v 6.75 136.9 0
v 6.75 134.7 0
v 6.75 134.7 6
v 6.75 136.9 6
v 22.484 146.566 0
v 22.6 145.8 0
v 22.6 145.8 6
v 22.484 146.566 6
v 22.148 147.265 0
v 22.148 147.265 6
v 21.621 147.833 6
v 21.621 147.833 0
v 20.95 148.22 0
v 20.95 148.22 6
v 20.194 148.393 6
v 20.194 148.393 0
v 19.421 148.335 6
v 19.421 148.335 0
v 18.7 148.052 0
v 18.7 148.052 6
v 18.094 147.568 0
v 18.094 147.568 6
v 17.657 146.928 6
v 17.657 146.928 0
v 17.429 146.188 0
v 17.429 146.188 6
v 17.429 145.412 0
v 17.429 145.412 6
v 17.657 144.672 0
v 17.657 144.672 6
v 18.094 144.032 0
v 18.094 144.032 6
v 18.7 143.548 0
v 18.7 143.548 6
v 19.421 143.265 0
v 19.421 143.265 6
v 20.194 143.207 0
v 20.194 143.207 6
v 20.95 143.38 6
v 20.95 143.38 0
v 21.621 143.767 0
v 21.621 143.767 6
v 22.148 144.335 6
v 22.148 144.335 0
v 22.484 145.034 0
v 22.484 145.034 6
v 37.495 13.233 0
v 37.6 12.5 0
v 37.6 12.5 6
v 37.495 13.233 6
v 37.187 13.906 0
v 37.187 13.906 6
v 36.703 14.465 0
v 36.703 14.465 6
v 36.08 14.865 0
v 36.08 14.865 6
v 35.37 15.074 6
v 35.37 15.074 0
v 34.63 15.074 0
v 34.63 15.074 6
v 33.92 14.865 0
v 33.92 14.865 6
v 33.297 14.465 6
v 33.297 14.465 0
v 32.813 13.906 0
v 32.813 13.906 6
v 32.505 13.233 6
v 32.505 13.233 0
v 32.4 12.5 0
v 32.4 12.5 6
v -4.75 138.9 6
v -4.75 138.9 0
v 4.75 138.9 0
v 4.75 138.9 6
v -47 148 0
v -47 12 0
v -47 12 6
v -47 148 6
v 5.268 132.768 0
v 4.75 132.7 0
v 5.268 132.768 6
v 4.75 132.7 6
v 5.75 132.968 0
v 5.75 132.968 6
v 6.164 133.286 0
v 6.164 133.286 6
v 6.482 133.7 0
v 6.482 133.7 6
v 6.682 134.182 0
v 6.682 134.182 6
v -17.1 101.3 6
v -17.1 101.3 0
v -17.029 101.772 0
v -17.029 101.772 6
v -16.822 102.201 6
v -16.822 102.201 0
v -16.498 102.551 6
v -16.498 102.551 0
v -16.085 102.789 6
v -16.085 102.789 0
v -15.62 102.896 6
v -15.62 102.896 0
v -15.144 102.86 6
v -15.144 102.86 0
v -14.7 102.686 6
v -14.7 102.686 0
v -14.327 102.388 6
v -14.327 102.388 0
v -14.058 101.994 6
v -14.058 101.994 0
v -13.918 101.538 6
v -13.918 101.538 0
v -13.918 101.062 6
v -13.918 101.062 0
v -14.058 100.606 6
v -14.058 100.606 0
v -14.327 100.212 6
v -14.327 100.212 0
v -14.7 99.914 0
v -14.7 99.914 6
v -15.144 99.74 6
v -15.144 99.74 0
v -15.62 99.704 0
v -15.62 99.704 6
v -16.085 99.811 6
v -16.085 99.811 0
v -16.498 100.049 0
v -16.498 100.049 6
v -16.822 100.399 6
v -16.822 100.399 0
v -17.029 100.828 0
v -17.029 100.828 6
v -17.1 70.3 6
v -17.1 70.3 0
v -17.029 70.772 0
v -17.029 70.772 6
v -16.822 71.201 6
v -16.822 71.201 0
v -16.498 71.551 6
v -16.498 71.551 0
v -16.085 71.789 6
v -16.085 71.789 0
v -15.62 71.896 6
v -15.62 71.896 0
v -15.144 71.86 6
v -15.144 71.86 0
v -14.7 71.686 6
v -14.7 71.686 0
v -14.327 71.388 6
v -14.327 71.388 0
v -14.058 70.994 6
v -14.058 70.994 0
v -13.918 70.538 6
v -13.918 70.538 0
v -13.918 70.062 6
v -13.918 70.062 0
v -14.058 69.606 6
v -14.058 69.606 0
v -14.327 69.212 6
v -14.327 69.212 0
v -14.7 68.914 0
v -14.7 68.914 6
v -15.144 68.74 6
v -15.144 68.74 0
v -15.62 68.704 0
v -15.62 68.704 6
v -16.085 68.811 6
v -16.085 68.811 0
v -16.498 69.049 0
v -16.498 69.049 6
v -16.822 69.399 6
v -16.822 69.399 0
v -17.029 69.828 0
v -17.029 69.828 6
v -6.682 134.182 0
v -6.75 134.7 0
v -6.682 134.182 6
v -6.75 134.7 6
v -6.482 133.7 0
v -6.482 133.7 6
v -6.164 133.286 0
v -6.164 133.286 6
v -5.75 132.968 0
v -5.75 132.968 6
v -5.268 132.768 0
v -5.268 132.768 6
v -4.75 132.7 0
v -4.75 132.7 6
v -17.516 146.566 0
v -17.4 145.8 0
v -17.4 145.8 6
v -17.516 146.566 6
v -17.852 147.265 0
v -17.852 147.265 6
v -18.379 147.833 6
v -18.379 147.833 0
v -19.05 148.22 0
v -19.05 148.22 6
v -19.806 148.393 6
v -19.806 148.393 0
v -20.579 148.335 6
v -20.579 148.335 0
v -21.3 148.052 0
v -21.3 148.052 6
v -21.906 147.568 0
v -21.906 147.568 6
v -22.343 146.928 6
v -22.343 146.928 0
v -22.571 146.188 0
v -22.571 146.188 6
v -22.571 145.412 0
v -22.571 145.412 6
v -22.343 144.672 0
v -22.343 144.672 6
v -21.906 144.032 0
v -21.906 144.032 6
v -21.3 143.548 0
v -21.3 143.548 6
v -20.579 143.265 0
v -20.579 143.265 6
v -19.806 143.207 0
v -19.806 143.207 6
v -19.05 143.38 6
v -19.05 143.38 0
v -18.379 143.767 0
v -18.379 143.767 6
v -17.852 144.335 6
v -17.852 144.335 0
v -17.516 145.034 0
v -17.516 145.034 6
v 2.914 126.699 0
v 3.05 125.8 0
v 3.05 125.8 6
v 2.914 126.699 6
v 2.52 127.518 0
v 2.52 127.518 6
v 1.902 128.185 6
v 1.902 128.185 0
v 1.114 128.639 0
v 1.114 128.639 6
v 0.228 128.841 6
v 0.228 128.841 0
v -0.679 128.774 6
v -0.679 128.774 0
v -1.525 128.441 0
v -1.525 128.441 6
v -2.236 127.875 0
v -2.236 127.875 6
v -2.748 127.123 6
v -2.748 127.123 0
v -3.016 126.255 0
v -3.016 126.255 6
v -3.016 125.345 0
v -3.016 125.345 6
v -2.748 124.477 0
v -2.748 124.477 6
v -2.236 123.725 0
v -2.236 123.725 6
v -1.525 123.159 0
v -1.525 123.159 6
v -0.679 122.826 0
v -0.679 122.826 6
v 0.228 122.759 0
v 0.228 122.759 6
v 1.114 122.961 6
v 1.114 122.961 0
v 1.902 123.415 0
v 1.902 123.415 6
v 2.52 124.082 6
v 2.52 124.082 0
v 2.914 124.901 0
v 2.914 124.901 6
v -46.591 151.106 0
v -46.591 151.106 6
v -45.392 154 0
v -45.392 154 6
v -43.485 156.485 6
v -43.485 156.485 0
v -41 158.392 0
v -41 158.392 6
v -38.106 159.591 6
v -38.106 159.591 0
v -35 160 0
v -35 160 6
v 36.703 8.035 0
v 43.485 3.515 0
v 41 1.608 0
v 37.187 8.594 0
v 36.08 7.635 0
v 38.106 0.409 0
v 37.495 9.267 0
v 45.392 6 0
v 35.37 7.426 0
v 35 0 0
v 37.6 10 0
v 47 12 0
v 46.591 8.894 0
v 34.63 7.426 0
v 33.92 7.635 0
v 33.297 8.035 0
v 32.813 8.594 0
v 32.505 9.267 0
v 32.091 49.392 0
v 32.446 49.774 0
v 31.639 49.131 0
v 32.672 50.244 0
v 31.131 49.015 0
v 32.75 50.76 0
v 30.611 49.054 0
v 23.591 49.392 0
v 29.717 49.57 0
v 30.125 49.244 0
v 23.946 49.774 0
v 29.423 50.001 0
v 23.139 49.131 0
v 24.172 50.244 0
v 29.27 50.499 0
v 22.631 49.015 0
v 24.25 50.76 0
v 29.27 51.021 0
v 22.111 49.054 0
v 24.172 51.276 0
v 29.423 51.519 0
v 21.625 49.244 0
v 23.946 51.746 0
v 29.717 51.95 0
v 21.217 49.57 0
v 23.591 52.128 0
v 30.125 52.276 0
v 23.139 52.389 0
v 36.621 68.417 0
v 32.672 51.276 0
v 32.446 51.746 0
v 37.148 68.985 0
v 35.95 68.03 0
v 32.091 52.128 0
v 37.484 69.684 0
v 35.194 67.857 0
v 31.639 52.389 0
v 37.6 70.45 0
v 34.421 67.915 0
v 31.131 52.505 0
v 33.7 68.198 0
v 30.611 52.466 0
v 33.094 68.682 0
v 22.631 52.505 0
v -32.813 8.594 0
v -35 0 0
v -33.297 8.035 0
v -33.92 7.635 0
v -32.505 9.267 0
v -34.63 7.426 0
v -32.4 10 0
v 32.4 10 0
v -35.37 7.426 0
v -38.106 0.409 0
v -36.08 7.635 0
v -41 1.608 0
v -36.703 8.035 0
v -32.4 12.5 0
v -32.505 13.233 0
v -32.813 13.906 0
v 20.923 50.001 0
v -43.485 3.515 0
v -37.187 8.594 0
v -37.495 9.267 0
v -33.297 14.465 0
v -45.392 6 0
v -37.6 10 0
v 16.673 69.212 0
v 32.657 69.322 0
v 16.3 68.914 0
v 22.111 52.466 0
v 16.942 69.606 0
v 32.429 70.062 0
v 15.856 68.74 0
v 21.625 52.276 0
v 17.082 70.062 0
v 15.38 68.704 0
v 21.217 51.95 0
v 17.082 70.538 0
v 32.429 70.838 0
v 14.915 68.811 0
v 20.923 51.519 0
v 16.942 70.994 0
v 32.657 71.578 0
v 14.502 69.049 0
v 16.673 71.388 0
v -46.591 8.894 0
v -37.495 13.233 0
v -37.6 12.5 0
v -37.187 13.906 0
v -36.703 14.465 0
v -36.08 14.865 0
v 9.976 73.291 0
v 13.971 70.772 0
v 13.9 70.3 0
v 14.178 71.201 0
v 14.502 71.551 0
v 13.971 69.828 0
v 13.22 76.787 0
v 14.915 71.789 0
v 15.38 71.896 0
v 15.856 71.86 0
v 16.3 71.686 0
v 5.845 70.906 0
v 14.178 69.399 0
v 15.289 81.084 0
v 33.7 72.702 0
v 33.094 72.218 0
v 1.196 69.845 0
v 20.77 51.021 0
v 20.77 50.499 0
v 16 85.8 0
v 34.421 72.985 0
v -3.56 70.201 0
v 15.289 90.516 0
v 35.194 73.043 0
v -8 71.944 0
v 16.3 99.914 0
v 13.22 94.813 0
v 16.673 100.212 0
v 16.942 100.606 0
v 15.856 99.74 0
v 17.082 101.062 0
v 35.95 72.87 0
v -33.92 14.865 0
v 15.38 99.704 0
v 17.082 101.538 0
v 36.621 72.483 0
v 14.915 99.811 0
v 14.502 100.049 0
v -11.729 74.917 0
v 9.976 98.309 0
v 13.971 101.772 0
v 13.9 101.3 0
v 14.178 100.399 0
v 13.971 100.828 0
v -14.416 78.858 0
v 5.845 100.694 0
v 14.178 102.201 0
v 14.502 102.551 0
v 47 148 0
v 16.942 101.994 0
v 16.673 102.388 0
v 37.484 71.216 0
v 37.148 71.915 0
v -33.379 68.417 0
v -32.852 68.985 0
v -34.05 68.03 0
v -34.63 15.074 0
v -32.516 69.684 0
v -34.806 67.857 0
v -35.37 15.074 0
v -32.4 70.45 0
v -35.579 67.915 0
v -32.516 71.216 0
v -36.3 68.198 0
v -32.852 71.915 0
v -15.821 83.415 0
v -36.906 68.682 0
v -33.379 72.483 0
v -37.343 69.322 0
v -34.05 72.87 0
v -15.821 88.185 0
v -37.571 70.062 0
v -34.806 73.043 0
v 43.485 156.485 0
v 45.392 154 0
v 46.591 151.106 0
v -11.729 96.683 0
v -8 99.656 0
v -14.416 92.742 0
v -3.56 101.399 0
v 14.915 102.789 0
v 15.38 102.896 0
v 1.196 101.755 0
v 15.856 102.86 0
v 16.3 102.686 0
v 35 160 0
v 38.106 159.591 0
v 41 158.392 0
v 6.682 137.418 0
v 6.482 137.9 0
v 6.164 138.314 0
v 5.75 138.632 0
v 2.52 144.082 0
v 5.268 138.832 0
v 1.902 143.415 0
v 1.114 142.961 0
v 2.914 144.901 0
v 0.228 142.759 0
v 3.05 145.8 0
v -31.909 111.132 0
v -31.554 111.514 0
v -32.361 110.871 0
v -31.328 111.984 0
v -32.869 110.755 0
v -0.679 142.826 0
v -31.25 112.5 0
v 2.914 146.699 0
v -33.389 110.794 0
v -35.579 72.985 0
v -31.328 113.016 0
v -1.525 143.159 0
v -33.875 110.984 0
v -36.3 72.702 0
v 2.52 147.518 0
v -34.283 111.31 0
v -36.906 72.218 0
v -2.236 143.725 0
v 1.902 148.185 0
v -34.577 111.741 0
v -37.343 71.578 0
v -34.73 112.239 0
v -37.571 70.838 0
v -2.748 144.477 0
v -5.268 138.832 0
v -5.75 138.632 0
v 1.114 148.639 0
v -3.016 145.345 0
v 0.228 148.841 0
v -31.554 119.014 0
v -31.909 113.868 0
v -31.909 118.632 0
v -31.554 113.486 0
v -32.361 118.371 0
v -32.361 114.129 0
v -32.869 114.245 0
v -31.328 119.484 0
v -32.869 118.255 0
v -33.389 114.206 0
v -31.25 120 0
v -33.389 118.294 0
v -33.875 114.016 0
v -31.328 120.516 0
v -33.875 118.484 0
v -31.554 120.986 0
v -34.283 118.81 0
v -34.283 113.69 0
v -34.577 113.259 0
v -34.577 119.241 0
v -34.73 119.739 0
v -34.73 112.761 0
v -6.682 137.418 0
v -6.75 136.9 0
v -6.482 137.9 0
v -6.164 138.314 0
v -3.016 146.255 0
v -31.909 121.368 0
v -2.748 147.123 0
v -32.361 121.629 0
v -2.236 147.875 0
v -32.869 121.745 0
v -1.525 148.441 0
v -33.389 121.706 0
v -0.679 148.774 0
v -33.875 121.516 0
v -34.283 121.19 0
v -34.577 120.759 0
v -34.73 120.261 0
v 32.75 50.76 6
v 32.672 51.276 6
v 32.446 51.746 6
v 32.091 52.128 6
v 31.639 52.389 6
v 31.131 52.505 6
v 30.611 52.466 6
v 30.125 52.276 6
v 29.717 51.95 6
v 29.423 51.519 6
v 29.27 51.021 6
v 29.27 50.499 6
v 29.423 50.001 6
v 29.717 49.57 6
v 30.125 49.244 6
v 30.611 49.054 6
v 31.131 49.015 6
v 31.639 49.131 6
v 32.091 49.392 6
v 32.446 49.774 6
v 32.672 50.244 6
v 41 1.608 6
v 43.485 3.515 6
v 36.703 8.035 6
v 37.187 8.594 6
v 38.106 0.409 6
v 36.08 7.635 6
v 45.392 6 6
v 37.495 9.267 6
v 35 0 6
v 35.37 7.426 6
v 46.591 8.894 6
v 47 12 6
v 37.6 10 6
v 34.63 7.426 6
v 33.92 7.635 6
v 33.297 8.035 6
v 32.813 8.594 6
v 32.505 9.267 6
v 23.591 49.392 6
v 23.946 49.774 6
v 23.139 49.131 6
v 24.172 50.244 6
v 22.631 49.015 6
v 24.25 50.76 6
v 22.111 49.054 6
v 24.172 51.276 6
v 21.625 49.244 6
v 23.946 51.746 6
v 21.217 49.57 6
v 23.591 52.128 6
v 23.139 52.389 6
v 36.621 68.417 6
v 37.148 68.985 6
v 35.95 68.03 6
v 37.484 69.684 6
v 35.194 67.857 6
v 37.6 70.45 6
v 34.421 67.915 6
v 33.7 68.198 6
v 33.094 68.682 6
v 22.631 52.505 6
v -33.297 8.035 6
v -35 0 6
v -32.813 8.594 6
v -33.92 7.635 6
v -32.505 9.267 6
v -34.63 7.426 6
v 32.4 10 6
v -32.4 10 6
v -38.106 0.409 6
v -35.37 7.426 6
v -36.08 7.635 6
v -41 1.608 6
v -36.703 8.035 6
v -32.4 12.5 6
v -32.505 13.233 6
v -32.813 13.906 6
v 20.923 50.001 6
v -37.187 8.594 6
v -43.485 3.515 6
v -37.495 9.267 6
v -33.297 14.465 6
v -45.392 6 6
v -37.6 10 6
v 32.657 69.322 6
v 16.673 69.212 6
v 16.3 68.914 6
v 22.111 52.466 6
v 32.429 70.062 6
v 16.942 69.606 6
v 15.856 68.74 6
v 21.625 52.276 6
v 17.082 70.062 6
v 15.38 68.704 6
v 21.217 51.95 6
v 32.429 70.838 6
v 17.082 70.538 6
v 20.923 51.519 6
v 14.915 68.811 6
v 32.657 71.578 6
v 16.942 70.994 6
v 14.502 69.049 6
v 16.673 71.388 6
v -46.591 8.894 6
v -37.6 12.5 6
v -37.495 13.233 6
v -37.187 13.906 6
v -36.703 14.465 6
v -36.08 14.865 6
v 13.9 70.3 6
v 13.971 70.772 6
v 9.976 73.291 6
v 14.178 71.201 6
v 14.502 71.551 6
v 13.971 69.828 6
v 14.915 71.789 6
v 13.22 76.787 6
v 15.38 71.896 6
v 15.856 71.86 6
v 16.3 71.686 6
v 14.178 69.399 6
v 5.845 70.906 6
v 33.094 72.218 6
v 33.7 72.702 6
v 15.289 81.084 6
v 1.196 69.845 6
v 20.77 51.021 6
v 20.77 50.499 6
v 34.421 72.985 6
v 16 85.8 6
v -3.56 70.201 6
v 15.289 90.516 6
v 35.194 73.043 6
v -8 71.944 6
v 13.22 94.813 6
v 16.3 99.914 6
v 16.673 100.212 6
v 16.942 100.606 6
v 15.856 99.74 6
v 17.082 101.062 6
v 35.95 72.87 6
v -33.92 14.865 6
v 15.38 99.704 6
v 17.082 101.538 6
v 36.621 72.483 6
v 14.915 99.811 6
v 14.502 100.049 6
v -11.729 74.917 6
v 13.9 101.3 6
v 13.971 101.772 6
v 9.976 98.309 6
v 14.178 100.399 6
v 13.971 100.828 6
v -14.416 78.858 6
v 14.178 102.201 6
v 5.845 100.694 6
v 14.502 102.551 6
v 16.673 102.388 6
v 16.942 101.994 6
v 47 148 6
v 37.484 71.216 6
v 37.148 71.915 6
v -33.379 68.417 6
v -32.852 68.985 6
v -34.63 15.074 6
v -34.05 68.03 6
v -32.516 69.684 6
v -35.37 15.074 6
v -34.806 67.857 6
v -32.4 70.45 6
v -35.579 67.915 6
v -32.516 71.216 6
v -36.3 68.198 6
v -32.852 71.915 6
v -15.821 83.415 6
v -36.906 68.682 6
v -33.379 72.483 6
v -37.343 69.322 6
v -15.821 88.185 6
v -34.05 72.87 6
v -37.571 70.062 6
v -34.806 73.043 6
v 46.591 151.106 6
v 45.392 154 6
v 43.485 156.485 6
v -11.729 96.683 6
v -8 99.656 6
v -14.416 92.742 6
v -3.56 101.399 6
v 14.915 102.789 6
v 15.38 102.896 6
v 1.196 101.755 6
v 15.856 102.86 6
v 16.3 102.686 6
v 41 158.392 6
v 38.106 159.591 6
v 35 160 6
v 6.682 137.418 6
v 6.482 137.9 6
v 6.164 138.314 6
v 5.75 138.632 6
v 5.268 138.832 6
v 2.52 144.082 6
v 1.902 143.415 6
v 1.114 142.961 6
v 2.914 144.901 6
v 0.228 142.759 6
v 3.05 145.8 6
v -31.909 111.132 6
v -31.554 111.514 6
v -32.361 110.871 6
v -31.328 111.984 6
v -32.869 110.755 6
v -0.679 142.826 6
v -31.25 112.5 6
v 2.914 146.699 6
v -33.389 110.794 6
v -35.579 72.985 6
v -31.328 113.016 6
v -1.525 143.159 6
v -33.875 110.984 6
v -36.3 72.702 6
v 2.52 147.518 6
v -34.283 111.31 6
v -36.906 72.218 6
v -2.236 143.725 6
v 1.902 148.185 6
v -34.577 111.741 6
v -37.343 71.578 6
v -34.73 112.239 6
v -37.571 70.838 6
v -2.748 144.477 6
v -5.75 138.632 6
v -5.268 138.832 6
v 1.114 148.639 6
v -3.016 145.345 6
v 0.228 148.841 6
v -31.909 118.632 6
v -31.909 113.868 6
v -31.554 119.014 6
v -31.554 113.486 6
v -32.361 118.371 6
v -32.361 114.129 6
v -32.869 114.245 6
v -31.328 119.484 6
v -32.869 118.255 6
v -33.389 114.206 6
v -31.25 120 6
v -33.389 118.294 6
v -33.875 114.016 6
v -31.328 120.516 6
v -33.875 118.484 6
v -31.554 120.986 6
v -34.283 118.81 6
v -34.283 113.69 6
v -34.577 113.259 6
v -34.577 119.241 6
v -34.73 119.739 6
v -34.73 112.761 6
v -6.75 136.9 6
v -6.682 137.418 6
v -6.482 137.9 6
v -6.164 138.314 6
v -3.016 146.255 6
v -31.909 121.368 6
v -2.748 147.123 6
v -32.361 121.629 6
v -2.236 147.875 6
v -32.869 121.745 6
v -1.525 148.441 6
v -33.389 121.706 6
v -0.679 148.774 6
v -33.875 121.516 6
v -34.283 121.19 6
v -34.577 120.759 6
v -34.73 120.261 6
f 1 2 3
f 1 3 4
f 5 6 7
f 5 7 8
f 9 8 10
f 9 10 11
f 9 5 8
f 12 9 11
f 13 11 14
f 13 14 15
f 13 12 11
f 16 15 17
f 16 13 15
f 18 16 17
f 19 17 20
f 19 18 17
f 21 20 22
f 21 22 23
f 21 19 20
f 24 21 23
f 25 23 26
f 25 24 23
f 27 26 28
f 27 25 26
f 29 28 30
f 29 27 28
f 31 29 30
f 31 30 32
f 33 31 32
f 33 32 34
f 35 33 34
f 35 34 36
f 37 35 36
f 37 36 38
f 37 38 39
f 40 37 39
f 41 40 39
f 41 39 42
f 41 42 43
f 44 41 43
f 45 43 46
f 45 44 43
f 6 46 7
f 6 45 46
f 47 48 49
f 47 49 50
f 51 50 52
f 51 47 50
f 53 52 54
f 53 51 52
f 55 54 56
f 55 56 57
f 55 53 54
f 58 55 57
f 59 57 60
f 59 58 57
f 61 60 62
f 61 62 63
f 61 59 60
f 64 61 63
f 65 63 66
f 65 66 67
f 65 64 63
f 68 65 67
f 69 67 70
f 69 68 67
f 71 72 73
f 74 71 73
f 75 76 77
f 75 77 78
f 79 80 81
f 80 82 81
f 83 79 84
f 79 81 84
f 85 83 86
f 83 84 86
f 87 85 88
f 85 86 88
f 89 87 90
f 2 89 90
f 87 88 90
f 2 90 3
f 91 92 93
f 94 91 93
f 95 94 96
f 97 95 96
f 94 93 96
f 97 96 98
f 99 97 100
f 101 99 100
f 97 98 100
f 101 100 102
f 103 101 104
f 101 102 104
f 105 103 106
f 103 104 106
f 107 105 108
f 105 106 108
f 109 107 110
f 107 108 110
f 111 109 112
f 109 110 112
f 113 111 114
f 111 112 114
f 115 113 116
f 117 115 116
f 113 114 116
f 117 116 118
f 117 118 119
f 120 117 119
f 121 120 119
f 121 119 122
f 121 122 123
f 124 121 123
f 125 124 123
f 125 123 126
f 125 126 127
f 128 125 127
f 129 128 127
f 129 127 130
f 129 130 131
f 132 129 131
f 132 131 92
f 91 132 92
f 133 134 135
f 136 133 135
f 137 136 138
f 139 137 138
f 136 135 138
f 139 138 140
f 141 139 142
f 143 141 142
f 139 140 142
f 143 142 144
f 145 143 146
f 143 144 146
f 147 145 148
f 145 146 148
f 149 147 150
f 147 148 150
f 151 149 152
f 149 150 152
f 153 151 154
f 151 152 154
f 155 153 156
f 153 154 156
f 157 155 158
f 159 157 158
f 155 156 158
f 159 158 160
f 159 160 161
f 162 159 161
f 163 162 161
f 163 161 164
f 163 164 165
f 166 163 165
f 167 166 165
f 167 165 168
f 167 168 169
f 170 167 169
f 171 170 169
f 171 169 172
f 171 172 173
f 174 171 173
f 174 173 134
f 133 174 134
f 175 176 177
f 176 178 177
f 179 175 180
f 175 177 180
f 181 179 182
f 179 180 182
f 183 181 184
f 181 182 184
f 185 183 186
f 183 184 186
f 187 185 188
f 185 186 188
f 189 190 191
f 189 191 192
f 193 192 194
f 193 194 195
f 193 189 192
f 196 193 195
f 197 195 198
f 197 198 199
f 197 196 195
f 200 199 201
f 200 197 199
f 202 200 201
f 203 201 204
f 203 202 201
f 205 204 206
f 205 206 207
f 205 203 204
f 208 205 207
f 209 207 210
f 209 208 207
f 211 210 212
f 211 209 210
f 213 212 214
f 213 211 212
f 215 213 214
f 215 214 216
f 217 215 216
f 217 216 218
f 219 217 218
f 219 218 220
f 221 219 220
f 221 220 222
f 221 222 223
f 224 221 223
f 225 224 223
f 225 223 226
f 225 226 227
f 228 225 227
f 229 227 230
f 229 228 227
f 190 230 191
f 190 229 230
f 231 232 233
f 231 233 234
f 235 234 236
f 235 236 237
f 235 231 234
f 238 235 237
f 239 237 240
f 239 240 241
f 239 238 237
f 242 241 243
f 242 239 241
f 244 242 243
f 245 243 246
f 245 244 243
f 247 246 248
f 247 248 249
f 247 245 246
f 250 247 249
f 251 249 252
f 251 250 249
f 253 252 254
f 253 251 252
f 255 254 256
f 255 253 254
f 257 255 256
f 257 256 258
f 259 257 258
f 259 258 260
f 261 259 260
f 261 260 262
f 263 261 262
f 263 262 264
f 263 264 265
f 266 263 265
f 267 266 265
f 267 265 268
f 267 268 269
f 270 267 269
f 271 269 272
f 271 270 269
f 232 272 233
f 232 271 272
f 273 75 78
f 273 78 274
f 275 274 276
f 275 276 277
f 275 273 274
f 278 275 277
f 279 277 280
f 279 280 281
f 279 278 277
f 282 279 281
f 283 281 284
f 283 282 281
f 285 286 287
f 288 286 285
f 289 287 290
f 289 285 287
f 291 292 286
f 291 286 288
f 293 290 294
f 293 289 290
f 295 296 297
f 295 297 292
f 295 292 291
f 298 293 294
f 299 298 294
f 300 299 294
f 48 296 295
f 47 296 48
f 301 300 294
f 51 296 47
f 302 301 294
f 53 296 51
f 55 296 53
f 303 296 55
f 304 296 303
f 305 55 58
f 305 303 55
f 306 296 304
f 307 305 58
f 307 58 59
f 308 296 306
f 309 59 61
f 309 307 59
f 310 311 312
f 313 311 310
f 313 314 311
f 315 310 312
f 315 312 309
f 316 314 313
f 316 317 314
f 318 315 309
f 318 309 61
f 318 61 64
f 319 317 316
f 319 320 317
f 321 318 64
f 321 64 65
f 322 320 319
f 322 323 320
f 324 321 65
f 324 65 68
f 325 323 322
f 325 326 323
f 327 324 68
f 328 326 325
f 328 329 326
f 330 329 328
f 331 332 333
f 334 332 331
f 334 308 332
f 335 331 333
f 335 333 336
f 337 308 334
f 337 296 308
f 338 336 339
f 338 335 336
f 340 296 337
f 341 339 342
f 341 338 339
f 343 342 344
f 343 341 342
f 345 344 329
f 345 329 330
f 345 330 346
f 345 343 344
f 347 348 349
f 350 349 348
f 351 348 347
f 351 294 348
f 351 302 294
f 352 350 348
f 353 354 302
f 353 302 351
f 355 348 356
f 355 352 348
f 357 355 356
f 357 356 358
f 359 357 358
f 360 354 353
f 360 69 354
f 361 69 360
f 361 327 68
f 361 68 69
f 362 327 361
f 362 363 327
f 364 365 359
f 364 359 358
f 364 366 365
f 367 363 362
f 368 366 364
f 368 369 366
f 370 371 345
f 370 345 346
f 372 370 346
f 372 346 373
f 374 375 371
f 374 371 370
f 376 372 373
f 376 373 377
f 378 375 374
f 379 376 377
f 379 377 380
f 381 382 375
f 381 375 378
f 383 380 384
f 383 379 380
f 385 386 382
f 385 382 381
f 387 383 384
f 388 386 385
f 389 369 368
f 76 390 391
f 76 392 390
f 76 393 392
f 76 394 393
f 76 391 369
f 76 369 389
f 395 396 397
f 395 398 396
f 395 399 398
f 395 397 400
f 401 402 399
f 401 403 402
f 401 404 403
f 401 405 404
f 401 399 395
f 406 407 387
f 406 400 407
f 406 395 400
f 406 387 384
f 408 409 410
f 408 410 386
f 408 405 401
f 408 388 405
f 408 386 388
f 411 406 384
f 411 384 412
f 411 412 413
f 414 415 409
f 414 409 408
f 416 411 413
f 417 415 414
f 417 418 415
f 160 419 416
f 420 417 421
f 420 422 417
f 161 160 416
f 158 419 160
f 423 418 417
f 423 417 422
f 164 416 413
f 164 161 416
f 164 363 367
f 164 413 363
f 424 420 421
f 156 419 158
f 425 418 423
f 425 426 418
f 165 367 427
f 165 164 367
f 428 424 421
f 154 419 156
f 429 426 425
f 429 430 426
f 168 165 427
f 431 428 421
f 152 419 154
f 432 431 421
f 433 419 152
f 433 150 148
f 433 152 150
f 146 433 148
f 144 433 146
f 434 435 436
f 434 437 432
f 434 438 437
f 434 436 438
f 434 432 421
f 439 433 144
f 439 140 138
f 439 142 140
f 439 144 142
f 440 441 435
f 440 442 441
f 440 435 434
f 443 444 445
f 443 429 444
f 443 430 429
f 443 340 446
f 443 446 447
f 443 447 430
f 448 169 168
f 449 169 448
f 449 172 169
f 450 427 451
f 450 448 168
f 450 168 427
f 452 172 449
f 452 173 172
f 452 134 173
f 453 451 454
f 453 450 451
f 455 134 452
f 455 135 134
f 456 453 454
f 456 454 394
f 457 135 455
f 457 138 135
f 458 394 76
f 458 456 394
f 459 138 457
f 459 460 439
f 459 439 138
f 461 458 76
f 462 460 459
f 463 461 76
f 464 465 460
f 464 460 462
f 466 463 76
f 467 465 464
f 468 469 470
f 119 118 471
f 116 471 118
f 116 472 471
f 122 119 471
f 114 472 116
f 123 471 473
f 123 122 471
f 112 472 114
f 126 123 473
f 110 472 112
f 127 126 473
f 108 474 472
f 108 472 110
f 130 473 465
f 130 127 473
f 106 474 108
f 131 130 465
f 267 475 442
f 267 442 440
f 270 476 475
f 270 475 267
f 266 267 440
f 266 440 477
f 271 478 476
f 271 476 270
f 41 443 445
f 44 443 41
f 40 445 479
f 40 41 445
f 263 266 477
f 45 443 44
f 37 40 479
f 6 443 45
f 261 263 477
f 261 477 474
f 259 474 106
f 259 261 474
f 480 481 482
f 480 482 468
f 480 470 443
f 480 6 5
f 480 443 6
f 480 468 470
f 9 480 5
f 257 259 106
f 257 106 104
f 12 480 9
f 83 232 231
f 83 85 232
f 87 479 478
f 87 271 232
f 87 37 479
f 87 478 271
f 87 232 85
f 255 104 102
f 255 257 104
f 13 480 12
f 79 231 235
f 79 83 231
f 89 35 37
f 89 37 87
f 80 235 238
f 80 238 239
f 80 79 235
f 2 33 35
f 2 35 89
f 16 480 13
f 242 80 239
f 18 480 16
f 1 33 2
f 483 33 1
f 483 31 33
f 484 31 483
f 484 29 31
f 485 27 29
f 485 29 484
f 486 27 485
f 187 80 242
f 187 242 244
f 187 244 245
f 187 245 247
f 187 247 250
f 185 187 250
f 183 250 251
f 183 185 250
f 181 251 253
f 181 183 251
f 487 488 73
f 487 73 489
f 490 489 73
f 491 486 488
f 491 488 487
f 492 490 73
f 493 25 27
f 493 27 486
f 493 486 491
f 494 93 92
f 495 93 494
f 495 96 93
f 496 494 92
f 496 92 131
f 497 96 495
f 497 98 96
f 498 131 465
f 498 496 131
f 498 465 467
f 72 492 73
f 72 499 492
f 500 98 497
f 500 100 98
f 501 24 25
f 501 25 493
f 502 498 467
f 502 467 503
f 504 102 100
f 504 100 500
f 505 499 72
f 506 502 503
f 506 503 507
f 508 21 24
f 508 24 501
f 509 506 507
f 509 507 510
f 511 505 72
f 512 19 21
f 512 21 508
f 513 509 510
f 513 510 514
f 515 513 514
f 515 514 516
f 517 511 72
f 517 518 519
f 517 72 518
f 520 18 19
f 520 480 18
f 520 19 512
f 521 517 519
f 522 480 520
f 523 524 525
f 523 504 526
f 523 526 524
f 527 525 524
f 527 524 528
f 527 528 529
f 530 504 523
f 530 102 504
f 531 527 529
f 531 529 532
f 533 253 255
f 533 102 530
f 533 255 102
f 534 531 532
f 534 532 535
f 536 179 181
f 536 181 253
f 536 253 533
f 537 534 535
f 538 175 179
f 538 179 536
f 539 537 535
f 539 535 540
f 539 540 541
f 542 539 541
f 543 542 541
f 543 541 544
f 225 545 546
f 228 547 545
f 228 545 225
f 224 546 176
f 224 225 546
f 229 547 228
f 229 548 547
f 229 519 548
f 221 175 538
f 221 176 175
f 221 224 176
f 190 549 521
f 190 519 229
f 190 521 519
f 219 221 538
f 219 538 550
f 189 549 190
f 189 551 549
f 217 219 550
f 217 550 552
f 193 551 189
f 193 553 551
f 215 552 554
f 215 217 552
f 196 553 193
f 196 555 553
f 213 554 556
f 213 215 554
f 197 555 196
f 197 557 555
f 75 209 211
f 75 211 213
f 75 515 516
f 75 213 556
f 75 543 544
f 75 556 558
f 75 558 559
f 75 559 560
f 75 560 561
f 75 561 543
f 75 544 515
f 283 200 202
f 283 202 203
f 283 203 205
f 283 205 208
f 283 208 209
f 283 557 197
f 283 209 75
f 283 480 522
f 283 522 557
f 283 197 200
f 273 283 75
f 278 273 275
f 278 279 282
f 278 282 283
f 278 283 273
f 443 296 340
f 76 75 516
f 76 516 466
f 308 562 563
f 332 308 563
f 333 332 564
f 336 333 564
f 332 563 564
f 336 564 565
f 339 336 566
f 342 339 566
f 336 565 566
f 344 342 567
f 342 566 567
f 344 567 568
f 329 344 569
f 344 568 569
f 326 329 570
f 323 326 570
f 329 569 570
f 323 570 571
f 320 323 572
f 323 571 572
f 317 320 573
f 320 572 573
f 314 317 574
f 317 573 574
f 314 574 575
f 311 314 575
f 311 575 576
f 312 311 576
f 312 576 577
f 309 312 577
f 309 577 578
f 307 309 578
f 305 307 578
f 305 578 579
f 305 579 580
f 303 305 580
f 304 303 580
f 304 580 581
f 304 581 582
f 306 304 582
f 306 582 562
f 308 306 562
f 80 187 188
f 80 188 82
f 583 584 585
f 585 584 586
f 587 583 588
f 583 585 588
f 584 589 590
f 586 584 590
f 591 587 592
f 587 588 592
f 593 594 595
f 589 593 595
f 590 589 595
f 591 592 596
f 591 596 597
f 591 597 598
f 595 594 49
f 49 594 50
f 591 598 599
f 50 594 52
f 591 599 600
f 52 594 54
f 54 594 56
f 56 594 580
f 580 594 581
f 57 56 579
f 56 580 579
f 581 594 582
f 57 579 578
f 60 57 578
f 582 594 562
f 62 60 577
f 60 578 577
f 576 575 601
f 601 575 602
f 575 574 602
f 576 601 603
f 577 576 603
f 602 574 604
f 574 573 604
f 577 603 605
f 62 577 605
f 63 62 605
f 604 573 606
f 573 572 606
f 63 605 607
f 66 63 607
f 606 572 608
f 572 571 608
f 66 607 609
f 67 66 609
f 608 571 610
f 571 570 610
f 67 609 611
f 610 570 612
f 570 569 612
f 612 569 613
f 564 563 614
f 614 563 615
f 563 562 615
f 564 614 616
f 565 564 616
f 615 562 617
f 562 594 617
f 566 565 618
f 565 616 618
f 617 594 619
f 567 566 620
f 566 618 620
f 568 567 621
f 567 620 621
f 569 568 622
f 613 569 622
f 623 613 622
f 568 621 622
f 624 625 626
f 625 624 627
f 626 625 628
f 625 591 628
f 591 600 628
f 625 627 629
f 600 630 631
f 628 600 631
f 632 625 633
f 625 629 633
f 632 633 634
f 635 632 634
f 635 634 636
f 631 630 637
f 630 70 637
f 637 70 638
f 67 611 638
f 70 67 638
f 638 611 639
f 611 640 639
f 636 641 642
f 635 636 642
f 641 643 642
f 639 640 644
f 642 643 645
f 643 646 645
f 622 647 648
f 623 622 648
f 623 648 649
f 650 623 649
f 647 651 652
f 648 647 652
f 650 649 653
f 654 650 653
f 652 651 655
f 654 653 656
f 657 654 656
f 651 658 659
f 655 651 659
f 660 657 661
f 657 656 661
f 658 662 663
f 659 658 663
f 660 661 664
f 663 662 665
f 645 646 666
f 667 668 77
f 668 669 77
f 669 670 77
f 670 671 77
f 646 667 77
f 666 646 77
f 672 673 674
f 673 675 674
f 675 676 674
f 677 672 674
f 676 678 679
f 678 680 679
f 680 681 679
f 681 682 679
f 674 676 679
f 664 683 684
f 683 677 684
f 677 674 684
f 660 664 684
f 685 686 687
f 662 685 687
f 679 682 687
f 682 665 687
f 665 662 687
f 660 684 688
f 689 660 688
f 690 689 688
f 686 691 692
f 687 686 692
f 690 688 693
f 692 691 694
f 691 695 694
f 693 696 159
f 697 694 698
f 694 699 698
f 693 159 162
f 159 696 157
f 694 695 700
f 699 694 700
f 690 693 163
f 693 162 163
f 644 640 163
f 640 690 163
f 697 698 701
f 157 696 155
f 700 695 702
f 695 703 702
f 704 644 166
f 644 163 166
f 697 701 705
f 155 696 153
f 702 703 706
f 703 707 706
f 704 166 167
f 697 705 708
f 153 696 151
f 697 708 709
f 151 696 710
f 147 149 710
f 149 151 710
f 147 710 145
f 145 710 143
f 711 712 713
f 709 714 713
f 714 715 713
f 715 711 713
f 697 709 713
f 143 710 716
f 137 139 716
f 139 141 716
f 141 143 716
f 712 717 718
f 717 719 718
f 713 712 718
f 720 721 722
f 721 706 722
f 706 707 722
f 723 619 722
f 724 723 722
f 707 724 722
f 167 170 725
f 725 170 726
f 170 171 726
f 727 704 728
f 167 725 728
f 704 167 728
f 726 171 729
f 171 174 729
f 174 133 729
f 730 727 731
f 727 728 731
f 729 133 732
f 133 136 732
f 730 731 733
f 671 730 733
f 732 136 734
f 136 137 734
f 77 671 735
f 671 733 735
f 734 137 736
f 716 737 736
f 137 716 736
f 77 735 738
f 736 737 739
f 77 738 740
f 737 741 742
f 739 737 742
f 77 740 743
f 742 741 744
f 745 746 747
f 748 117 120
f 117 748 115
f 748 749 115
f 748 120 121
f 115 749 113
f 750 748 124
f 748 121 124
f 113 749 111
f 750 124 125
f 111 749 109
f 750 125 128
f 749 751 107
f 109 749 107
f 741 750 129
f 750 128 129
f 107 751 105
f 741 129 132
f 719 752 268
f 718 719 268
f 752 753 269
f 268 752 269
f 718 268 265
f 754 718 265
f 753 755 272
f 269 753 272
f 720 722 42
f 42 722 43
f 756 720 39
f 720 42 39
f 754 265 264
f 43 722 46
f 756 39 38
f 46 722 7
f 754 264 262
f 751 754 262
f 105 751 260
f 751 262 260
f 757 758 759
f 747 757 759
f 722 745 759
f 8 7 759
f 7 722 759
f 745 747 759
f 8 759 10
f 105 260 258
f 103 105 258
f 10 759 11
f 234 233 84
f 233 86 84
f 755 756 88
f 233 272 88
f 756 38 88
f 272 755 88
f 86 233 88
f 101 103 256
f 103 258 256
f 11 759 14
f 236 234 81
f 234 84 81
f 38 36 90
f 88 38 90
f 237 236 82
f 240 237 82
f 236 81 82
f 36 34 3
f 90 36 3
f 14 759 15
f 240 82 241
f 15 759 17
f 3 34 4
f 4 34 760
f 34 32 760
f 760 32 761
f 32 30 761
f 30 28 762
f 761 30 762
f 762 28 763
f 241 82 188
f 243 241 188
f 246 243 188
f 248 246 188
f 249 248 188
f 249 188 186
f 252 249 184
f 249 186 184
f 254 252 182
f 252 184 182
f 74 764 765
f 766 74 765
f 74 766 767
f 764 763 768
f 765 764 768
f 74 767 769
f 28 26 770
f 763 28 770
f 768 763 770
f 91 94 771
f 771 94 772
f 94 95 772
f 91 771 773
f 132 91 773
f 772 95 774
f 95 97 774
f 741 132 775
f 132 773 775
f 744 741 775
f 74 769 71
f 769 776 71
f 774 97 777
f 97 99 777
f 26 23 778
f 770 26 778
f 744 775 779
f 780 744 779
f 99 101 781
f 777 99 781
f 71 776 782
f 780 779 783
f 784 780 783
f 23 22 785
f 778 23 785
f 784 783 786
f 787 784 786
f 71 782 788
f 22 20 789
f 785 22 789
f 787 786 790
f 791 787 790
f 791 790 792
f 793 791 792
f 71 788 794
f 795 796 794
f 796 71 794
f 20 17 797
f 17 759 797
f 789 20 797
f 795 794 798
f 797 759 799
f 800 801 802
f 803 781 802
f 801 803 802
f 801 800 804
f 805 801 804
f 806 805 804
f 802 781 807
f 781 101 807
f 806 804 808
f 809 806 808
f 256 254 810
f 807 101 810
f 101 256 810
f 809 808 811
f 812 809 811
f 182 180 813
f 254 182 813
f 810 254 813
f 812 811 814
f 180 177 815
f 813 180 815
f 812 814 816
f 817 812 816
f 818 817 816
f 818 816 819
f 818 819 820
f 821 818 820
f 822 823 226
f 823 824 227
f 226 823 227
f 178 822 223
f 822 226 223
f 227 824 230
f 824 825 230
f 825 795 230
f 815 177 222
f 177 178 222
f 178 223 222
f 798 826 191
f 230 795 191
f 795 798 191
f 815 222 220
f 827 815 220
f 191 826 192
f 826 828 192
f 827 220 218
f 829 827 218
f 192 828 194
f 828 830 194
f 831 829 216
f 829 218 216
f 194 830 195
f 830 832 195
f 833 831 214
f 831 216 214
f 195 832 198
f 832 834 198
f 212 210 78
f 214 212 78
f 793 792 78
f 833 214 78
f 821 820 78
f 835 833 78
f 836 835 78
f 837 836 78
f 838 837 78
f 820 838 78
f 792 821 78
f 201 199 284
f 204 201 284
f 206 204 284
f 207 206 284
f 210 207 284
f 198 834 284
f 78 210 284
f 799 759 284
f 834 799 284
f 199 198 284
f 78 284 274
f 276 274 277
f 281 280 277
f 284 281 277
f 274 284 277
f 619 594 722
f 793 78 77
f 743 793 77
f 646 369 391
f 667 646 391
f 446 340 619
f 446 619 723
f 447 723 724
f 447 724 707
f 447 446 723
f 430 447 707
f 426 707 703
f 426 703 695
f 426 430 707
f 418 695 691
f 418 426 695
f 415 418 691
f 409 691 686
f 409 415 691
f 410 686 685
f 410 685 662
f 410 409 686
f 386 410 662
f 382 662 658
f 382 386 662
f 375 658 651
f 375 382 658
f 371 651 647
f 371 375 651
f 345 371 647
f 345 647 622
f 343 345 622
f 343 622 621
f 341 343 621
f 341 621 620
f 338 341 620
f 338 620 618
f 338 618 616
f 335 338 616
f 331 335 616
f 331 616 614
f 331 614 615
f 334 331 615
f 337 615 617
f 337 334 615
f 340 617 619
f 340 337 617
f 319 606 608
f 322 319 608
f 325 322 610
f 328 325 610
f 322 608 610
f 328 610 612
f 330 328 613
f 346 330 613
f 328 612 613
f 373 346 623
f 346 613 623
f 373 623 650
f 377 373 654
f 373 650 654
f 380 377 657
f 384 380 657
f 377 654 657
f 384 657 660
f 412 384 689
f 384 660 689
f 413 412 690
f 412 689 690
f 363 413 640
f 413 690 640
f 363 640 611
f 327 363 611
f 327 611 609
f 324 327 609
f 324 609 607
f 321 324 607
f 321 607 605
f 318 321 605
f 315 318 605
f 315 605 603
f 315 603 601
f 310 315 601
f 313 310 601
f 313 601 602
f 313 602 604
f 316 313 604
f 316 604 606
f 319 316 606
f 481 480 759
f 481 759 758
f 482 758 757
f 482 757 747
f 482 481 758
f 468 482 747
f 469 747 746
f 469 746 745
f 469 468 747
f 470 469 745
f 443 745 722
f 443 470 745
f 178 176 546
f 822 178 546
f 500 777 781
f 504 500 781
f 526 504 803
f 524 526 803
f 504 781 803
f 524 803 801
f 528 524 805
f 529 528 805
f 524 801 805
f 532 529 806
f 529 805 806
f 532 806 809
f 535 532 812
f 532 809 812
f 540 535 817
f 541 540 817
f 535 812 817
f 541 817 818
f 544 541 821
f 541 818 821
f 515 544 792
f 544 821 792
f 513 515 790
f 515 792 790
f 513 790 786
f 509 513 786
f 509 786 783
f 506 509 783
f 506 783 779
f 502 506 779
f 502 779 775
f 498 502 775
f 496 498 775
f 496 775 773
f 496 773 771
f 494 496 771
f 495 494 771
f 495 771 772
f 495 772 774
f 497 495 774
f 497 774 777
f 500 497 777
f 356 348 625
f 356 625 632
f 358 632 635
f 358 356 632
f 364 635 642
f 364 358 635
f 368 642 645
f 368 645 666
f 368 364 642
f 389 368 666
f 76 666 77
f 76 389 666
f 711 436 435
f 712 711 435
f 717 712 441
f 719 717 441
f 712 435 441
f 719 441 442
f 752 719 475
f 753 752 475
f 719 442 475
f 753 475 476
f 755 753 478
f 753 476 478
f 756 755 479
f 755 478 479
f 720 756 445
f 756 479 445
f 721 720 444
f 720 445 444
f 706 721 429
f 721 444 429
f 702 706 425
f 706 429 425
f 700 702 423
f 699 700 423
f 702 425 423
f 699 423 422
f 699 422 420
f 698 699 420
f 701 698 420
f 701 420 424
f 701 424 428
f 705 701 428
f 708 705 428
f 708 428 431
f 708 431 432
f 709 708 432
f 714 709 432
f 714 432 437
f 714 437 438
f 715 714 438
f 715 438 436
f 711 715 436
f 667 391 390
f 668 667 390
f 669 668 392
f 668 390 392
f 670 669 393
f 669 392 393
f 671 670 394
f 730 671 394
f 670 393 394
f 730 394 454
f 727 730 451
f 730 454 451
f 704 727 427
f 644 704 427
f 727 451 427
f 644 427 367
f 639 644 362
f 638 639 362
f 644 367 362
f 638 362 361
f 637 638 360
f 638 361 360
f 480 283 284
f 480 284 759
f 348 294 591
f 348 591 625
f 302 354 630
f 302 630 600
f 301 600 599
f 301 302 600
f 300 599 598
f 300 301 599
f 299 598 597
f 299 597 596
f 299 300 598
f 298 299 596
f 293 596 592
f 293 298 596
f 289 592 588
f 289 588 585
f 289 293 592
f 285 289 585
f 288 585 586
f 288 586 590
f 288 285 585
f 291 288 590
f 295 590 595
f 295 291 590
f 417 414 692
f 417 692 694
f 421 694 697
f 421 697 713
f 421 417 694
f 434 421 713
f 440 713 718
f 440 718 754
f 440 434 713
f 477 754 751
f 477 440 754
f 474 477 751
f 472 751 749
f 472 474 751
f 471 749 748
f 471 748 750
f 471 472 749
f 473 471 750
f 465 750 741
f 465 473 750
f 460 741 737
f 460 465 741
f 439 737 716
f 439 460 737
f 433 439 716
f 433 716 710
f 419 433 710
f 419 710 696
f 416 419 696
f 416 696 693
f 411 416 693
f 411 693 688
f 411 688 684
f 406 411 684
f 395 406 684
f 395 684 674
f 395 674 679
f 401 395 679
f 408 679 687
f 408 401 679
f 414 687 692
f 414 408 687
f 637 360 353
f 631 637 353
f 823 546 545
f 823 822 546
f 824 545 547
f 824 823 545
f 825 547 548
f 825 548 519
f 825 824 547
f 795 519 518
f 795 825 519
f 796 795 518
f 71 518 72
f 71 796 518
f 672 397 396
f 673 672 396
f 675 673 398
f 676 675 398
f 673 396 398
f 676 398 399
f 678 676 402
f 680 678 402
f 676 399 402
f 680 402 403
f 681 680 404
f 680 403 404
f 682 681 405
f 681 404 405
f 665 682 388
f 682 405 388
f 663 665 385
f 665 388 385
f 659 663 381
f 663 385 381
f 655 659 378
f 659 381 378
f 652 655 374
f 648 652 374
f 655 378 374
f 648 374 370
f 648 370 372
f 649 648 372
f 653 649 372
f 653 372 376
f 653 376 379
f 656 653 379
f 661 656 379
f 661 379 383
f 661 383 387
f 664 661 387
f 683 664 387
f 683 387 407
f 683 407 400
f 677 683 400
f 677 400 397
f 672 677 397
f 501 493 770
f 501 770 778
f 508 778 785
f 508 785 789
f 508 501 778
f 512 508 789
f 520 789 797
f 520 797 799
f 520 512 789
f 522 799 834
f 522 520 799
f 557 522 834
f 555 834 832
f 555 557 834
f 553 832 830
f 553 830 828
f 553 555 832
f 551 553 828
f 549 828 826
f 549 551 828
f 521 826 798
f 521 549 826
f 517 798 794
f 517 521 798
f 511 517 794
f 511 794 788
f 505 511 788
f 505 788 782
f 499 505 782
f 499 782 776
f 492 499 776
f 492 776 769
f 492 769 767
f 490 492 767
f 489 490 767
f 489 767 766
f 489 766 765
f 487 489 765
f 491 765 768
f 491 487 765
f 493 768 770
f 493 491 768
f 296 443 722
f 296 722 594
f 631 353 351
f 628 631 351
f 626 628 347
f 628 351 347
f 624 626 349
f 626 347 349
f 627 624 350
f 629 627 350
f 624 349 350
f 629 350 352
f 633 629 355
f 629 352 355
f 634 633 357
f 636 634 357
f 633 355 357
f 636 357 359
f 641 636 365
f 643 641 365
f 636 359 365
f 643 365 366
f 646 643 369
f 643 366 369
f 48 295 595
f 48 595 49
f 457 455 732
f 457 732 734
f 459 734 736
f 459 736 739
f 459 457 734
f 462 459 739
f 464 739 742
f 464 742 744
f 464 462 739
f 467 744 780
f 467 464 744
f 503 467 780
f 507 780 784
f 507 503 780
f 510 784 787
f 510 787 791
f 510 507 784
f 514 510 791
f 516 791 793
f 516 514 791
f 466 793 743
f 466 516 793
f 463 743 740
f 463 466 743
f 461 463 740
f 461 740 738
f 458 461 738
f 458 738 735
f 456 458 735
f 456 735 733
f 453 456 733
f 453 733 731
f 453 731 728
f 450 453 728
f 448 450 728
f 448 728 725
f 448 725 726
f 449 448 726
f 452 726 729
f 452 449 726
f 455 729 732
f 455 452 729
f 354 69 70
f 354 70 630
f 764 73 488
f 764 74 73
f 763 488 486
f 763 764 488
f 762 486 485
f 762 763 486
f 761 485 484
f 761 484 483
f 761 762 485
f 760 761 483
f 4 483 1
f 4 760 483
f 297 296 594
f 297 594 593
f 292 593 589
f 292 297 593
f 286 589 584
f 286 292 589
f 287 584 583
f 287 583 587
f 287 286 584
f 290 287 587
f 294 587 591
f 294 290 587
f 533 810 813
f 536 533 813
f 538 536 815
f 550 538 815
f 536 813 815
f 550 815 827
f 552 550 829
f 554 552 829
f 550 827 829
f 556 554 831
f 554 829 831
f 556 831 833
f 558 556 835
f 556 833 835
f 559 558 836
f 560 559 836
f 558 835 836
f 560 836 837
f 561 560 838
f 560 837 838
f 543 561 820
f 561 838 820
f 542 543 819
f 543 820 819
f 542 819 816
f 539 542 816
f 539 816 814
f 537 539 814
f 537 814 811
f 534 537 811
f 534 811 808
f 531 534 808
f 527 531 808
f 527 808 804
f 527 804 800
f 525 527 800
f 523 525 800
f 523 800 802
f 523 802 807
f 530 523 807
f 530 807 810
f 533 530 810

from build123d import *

# Parameters (mm, degrees)
MODEL_R                         = 16
MODEL_R_2                       = 3.05
MODEL_R_3                       = 2.6
MODEL_W                         = 13.5
MODEL_H                         = 6.2
BASE_DEPTH                      = 6
SKETCH1_R                       = 1.75
SENSORMOUNT_DEPTH               = 167.868211472
SKETCH2_R                       = 1.75
CABLEMOUNT_DEPTH                = 10
FILLETCABLESLOT_R               = 2
F_3_2_3_2_STEPPER_MOUNT_HOLES_D = 3.2


with BuildPart() as part:
    # Model → Base (new body)
    with BuildSketch(Plane.XY):
        with BuildLine():
            Line((-35, 160), (35, 160))
            ThreePointArc((35, 160), (43.485281374, 156.485281374), (47, 148))
            Line((47, 148), (47, 12))
            ThreePointArc((47, 12), (43.485281374, 3.514718626), (35, 0))
            Line((35, 0), (-35, 0))
            ThreePointArc((-35, 0), (-43.485281374, 3.514718626), (-47, 12))
            Line((-47, 12), (-47, 148))
            ThreePointArc((-47, 148), (-43.485281374, 156.485281374), (-35, 160))
        make_face()
        with Locations((0, 85.8)):
            Circle(MODEL_R, mode=Mode.SUBTRACT)
        with Locations((0, 145.8)):
            Circle(MODEL_R_2, mode=Mode.SUBTRACT)
        with Locations((-20, 145.8)):
            Circle(MODEL_R_3, mode=Mode.SUBTRACT)
        with Locations((20, 145.8)):
            Circle(MODEL_R_3, mode=Mode.SUBTRACT)
        with Locations((-35, 70.45)):
            Circle(MODEL_R_3, mode=Mode.SUBTRACT)
        with Locations((0, 125.8)):
            Circle(MODEL_R_2, mode=Mode.SUBTRACT)
        with Locations((35, 70.45)):
            Circle(MODEL_R_3, mode=Mode.SUBTRACT)
        with BuildLine():
            Line((-32.4, 12.5), (-32.4, 10))
            ThreePointArc((-32.4, 10), (-35, 7.4), (-37.6, 10))
            Line((-37.6, 10), (-37.6, 12.5))
            ThreePointArc((-37.6, 12.5), (-35, 15.1), (-32.4, 12.5))
        make_face(mode=Mode.SUBTRACT)
        with BuildLine():
            Line((32.4, 12.5), (32.4, 10))
            ThreePointArc((32.4, 10), (35, 7.4), (37.6, 10))
            Line((37.6, 10), (37.6, 12.5))
            ThreePointArc((37.6, 12.5), (35, 15.1), (32.4, 12.5))
        make_face(mode=Mode.SUBTRACT)
        with Locations((0, 135.8)):
            Rectangle(MODEL_W, MODEL_H, mode=Mode.SUBTRACT)
    extrude(amount=BASE_DEPTH)

    # Sketch1 → SensorMount (cut, through all)
    with BuildSketch(Plane.XY.offset(6)):
        with Locations((-33, 120)):
            Circle(SKETCH1_R)
        with Locations((-33, 112.5)):
            Circle(SKETCH1_R)
    extrude(amount=-SENSORMOUNT_DEPTH, mode=Mode.SUBTRACT)

    # Sketch2 → CableMount (cut)
    with BuildSketch(Plane.XY.offset(6)):
        with Locations((22.5, 50.76)):
            Circle(SKETCH2_R)
        with Locations((31, 50.76)):
            Circle(SKETCH2_R)
    extrude(amount=-CABLEMOUNT_DEPTH, mode=Mode.SUBTRACT)

    # FilletCableSlot
    filletcableslot_edges = [part.edges().sort_by_distance(p)[0] for p in [
        (6.75, 138.9, 3),
        (-6.75, 138.9, 3),
        (-6.75, 132.7, 3),
        (6.75, 132.7, 3),
    ]]
    fillet(filletcableslot_edges, radius=FILLETCABLESLOT_R)

    # Ø3.2 (3.2) Stepper mount Holes (through all)
    with Locations(Plane.XY.offset(6)):
        with Locations((-15.5, 101.3), (-15.5, 70.3), (15.5, 70.3), (15.5, 101.3)):
            Hole(F_3_2_3_2_STEPPER_MOUNT_HOLES_D / 2)


solid = part.part
